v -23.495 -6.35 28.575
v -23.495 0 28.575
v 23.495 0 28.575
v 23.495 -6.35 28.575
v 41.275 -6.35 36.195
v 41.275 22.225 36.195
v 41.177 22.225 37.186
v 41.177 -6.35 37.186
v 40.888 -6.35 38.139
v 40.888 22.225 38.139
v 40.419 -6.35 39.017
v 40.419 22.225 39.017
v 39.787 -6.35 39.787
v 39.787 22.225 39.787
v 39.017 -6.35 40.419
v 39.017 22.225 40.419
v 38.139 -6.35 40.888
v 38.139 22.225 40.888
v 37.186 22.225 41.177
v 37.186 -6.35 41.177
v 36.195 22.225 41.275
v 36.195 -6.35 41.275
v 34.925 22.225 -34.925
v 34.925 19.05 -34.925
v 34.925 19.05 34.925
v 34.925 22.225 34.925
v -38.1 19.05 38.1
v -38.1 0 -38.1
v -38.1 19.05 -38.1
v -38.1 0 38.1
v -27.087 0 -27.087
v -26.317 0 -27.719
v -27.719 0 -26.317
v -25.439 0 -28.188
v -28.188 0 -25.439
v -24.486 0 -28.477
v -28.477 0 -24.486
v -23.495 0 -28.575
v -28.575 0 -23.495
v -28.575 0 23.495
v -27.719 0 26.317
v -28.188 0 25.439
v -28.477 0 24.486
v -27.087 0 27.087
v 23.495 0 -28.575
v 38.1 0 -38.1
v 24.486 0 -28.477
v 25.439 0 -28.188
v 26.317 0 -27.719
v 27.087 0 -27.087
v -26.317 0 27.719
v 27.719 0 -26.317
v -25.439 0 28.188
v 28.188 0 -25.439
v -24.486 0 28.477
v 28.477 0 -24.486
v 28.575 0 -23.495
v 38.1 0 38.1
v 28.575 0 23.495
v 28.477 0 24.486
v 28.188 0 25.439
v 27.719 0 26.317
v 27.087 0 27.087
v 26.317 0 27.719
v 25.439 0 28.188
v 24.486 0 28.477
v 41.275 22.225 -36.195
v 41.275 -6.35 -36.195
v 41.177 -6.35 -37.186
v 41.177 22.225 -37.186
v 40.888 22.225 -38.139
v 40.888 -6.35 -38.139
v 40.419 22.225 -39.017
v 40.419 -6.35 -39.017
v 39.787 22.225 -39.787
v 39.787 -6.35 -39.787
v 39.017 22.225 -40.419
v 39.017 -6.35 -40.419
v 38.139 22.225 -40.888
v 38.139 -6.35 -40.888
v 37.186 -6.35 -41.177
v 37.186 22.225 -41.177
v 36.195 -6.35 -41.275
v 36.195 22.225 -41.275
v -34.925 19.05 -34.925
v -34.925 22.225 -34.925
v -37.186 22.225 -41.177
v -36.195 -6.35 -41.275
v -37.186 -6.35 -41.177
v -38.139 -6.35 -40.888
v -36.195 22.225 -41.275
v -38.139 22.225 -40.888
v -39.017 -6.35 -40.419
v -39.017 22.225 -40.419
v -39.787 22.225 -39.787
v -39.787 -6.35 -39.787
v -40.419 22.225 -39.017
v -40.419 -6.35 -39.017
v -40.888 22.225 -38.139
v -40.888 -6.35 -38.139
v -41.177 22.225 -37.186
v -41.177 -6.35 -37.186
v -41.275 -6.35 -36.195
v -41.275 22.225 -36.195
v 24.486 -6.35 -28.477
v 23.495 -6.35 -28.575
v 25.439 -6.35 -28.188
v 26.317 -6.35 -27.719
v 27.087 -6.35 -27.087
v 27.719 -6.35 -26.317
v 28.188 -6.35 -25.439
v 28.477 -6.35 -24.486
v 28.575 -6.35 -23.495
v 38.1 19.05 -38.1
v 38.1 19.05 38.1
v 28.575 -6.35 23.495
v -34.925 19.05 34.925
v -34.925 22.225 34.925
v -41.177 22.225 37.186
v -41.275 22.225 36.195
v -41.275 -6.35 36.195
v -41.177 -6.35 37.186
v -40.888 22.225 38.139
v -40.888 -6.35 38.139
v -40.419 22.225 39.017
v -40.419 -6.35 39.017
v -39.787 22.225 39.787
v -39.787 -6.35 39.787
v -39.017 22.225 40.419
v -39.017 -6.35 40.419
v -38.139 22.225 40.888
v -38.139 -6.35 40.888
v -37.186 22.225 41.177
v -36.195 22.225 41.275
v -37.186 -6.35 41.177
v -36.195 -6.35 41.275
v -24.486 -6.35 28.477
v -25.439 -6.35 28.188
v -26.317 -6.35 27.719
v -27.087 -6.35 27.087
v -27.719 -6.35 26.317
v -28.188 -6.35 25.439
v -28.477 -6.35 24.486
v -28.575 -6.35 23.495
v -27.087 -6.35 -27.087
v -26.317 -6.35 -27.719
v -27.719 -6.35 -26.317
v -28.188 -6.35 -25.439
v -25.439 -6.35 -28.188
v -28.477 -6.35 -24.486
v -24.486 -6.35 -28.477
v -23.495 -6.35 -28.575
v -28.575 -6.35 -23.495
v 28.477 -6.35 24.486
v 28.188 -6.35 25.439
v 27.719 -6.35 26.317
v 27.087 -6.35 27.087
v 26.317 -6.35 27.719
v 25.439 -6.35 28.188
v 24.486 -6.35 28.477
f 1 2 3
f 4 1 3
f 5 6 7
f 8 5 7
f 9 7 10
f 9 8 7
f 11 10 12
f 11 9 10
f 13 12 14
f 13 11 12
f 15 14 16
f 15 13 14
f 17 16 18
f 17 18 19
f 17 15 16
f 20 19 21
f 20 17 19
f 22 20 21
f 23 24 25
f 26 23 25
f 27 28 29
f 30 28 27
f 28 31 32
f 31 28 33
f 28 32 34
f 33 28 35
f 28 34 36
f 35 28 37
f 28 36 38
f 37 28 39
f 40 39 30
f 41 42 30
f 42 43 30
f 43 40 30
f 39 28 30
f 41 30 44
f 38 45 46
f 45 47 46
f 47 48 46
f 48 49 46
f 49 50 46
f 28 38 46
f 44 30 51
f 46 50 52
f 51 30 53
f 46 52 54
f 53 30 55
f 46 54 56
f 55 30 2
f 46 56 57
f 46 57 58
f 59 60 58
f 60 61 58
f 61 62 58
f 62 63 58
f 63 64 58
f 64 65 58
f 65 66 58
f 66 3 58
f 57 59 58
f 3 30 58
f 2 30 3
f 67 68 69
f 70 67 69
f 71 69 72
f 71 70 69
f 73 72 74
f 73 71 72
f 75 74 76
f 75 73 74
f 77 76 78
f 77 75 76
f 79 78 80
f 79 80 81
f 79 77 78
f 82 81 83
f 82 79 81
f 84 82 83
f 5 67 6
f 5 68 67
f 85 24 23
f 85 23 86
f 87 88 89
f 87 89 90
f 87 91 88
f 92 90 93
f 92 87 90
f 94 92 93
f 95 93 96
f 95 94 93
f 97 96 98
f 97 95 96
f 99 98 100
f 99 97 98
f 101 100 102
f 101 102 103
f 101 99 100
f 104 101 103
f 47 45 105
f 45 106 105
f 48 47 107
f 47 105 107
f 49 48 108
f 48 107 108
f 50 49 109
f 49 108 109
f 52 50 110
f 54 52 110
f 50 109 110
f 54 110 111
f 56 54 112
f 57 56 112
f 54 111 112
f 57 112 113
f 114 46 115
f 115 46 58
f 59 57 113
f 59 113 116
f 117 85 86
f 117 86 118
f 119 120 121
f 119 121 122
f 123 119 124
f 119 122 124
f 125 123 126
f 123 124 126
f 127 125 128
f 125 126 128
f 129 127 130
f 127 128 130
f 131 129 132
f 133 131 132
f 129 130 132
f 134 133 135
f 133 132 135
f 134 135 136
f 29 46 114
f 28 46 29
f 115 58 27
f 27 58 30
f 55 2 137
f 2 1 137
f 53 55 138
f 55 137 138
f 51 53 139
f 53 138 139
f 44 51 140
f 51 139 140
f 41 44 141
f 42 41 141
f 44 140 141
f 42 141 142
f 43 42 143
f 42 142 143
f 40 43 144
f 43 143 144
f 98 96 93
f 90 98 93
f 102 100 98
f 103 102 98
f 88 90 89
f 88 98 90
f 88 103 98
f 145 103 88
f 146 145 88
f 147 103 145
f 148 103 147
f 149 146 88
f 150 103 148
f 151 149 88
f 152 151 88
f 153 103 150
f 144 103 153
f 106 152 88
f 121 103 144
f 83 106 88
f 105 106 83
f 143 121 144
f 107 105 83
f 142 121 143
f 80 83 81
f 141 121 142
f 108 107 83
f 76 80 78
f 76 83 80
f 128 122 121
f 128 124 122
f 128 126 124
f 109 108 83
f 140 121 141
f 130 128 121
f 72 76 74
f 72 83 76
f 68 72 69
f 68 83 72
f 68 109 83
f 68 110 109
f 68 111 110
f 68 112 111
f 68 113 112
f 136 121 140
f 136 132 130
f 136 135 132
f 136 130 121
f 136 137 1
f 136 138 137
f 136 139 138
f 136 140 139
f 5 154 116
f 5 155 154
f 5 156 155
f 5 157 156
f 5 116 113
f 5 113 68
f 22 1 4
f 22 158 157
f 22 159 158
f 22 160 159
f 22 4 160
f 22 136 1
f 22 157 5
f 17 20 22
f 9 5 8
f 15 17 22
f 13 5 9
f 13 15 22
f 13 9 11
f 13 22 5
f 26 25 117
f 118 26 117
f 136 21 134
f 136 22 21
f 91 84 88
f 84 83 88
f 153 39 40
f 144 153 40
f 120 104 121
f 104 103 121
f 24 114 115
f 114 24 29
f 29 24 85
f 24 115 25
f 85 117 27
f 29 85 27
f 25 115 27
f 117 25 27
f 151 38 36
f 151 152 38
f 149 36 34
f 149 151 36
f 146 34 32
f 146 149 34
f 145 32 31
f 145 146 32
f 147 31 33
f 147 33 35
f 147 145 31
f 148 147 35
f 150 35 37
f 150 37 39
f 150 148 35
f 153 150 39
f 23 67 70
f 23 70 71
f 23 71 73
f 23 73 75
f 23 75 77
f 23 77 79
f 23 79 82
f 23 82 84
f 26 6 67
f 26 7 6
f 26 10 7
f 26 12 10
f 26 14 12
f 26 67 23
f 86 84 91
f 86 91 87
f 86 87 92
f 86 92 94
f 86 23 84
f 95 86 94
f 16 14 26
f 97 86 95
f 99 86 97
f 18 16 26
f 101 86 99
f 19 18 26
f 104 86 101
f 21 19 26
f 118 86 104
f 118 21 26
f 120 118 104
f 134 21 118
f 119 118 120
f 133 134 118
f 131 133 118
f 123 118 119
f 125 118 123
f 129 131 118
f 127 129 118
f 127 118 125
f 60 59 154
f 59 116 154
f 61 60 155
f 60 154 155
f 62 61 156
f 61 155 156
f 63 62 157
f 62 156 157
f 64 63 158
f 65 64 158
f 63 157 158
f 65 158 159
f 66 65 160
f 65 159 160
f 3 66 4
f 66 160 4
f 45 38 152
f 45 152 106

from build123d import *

# Parameters (mm, degrees)
F0_W     = 82.55
F0_H     = 82.55
F0_W_2   = 57.15
F0_H_2   = 57.15
F1_DEPTH = 6.35
F2_W     = 82.55
F2_H     = 82.55
F2_W_2   = 76.2
F2_H_2   = 76.2
F3_DEPTH = 19.05
F4_W     = 82.55
F4_H     = 82.55
F4_W_2   = 69.85
F4_H_2   = 69.85
F5_DEPTH = 3.175
F6_R     = 5.08
F7_R     = 5.08


with BuildPart() as f1:
    # F0 (on Front) → F1 (new body)
    with BuildSketch(Plane.XZ):
        Rectangle(F0_W, F0_H)
        Rectangle(F0_W_2, F0_H_2, mode=Mode.SUBTRACT)
    extrude(amount=F1_DEPTH)

    # F2 (on face) → F3 (join)
    with BuildSketch(Plane(origin=(0, 0, 0), x_dir=(-1, 0, 0), z_dir=(0, 1, 0))):
        Rectangle(F2_W, F2_H)
        Rectangle(F2_W_2, F2_H_2, mode=Mode.SUBTRACT)
    extrude(amount=F3_DEPTH)

    # F4 (on face) → F5 (join)
    with BuildSketch(Plane(origin=(0, 19.05, 0), x_dir=(-1, 0, 0), z_dir=(0, 1, 0))):
        Rectangle(F4_W, F4_H)
        Rectangle(F4_W_2, F4_H_2, mode=Mode.SUBTRACT)
    extrude(amount=F5_DEPTH)

    # F6
    f6_edges = [f1.edges().sort_by_distance(p)[0] for p in [
        (41.275, 7.9375, -41.275),
        (41.275, 7.9375, 41.275),
        (-41.275, 7.9375, 41.275),
        (-41.275, 7.9375, -41.275),
    ]]
    fillet(f6_edges, radius=F6_R)

    # F7
    f7_edges = [f1.edges().sort_by_distance(p)[0] for p in [
        (-28.575, -3.175, -28.575),
        (28.575, -3.175, -28.575),
        (28.575, -3.175, 28.575),
        (-28.575, -3.175, 28.575),
    ]]
    fillet(f7_edges, radius=F7_R)


solid = f1.part
